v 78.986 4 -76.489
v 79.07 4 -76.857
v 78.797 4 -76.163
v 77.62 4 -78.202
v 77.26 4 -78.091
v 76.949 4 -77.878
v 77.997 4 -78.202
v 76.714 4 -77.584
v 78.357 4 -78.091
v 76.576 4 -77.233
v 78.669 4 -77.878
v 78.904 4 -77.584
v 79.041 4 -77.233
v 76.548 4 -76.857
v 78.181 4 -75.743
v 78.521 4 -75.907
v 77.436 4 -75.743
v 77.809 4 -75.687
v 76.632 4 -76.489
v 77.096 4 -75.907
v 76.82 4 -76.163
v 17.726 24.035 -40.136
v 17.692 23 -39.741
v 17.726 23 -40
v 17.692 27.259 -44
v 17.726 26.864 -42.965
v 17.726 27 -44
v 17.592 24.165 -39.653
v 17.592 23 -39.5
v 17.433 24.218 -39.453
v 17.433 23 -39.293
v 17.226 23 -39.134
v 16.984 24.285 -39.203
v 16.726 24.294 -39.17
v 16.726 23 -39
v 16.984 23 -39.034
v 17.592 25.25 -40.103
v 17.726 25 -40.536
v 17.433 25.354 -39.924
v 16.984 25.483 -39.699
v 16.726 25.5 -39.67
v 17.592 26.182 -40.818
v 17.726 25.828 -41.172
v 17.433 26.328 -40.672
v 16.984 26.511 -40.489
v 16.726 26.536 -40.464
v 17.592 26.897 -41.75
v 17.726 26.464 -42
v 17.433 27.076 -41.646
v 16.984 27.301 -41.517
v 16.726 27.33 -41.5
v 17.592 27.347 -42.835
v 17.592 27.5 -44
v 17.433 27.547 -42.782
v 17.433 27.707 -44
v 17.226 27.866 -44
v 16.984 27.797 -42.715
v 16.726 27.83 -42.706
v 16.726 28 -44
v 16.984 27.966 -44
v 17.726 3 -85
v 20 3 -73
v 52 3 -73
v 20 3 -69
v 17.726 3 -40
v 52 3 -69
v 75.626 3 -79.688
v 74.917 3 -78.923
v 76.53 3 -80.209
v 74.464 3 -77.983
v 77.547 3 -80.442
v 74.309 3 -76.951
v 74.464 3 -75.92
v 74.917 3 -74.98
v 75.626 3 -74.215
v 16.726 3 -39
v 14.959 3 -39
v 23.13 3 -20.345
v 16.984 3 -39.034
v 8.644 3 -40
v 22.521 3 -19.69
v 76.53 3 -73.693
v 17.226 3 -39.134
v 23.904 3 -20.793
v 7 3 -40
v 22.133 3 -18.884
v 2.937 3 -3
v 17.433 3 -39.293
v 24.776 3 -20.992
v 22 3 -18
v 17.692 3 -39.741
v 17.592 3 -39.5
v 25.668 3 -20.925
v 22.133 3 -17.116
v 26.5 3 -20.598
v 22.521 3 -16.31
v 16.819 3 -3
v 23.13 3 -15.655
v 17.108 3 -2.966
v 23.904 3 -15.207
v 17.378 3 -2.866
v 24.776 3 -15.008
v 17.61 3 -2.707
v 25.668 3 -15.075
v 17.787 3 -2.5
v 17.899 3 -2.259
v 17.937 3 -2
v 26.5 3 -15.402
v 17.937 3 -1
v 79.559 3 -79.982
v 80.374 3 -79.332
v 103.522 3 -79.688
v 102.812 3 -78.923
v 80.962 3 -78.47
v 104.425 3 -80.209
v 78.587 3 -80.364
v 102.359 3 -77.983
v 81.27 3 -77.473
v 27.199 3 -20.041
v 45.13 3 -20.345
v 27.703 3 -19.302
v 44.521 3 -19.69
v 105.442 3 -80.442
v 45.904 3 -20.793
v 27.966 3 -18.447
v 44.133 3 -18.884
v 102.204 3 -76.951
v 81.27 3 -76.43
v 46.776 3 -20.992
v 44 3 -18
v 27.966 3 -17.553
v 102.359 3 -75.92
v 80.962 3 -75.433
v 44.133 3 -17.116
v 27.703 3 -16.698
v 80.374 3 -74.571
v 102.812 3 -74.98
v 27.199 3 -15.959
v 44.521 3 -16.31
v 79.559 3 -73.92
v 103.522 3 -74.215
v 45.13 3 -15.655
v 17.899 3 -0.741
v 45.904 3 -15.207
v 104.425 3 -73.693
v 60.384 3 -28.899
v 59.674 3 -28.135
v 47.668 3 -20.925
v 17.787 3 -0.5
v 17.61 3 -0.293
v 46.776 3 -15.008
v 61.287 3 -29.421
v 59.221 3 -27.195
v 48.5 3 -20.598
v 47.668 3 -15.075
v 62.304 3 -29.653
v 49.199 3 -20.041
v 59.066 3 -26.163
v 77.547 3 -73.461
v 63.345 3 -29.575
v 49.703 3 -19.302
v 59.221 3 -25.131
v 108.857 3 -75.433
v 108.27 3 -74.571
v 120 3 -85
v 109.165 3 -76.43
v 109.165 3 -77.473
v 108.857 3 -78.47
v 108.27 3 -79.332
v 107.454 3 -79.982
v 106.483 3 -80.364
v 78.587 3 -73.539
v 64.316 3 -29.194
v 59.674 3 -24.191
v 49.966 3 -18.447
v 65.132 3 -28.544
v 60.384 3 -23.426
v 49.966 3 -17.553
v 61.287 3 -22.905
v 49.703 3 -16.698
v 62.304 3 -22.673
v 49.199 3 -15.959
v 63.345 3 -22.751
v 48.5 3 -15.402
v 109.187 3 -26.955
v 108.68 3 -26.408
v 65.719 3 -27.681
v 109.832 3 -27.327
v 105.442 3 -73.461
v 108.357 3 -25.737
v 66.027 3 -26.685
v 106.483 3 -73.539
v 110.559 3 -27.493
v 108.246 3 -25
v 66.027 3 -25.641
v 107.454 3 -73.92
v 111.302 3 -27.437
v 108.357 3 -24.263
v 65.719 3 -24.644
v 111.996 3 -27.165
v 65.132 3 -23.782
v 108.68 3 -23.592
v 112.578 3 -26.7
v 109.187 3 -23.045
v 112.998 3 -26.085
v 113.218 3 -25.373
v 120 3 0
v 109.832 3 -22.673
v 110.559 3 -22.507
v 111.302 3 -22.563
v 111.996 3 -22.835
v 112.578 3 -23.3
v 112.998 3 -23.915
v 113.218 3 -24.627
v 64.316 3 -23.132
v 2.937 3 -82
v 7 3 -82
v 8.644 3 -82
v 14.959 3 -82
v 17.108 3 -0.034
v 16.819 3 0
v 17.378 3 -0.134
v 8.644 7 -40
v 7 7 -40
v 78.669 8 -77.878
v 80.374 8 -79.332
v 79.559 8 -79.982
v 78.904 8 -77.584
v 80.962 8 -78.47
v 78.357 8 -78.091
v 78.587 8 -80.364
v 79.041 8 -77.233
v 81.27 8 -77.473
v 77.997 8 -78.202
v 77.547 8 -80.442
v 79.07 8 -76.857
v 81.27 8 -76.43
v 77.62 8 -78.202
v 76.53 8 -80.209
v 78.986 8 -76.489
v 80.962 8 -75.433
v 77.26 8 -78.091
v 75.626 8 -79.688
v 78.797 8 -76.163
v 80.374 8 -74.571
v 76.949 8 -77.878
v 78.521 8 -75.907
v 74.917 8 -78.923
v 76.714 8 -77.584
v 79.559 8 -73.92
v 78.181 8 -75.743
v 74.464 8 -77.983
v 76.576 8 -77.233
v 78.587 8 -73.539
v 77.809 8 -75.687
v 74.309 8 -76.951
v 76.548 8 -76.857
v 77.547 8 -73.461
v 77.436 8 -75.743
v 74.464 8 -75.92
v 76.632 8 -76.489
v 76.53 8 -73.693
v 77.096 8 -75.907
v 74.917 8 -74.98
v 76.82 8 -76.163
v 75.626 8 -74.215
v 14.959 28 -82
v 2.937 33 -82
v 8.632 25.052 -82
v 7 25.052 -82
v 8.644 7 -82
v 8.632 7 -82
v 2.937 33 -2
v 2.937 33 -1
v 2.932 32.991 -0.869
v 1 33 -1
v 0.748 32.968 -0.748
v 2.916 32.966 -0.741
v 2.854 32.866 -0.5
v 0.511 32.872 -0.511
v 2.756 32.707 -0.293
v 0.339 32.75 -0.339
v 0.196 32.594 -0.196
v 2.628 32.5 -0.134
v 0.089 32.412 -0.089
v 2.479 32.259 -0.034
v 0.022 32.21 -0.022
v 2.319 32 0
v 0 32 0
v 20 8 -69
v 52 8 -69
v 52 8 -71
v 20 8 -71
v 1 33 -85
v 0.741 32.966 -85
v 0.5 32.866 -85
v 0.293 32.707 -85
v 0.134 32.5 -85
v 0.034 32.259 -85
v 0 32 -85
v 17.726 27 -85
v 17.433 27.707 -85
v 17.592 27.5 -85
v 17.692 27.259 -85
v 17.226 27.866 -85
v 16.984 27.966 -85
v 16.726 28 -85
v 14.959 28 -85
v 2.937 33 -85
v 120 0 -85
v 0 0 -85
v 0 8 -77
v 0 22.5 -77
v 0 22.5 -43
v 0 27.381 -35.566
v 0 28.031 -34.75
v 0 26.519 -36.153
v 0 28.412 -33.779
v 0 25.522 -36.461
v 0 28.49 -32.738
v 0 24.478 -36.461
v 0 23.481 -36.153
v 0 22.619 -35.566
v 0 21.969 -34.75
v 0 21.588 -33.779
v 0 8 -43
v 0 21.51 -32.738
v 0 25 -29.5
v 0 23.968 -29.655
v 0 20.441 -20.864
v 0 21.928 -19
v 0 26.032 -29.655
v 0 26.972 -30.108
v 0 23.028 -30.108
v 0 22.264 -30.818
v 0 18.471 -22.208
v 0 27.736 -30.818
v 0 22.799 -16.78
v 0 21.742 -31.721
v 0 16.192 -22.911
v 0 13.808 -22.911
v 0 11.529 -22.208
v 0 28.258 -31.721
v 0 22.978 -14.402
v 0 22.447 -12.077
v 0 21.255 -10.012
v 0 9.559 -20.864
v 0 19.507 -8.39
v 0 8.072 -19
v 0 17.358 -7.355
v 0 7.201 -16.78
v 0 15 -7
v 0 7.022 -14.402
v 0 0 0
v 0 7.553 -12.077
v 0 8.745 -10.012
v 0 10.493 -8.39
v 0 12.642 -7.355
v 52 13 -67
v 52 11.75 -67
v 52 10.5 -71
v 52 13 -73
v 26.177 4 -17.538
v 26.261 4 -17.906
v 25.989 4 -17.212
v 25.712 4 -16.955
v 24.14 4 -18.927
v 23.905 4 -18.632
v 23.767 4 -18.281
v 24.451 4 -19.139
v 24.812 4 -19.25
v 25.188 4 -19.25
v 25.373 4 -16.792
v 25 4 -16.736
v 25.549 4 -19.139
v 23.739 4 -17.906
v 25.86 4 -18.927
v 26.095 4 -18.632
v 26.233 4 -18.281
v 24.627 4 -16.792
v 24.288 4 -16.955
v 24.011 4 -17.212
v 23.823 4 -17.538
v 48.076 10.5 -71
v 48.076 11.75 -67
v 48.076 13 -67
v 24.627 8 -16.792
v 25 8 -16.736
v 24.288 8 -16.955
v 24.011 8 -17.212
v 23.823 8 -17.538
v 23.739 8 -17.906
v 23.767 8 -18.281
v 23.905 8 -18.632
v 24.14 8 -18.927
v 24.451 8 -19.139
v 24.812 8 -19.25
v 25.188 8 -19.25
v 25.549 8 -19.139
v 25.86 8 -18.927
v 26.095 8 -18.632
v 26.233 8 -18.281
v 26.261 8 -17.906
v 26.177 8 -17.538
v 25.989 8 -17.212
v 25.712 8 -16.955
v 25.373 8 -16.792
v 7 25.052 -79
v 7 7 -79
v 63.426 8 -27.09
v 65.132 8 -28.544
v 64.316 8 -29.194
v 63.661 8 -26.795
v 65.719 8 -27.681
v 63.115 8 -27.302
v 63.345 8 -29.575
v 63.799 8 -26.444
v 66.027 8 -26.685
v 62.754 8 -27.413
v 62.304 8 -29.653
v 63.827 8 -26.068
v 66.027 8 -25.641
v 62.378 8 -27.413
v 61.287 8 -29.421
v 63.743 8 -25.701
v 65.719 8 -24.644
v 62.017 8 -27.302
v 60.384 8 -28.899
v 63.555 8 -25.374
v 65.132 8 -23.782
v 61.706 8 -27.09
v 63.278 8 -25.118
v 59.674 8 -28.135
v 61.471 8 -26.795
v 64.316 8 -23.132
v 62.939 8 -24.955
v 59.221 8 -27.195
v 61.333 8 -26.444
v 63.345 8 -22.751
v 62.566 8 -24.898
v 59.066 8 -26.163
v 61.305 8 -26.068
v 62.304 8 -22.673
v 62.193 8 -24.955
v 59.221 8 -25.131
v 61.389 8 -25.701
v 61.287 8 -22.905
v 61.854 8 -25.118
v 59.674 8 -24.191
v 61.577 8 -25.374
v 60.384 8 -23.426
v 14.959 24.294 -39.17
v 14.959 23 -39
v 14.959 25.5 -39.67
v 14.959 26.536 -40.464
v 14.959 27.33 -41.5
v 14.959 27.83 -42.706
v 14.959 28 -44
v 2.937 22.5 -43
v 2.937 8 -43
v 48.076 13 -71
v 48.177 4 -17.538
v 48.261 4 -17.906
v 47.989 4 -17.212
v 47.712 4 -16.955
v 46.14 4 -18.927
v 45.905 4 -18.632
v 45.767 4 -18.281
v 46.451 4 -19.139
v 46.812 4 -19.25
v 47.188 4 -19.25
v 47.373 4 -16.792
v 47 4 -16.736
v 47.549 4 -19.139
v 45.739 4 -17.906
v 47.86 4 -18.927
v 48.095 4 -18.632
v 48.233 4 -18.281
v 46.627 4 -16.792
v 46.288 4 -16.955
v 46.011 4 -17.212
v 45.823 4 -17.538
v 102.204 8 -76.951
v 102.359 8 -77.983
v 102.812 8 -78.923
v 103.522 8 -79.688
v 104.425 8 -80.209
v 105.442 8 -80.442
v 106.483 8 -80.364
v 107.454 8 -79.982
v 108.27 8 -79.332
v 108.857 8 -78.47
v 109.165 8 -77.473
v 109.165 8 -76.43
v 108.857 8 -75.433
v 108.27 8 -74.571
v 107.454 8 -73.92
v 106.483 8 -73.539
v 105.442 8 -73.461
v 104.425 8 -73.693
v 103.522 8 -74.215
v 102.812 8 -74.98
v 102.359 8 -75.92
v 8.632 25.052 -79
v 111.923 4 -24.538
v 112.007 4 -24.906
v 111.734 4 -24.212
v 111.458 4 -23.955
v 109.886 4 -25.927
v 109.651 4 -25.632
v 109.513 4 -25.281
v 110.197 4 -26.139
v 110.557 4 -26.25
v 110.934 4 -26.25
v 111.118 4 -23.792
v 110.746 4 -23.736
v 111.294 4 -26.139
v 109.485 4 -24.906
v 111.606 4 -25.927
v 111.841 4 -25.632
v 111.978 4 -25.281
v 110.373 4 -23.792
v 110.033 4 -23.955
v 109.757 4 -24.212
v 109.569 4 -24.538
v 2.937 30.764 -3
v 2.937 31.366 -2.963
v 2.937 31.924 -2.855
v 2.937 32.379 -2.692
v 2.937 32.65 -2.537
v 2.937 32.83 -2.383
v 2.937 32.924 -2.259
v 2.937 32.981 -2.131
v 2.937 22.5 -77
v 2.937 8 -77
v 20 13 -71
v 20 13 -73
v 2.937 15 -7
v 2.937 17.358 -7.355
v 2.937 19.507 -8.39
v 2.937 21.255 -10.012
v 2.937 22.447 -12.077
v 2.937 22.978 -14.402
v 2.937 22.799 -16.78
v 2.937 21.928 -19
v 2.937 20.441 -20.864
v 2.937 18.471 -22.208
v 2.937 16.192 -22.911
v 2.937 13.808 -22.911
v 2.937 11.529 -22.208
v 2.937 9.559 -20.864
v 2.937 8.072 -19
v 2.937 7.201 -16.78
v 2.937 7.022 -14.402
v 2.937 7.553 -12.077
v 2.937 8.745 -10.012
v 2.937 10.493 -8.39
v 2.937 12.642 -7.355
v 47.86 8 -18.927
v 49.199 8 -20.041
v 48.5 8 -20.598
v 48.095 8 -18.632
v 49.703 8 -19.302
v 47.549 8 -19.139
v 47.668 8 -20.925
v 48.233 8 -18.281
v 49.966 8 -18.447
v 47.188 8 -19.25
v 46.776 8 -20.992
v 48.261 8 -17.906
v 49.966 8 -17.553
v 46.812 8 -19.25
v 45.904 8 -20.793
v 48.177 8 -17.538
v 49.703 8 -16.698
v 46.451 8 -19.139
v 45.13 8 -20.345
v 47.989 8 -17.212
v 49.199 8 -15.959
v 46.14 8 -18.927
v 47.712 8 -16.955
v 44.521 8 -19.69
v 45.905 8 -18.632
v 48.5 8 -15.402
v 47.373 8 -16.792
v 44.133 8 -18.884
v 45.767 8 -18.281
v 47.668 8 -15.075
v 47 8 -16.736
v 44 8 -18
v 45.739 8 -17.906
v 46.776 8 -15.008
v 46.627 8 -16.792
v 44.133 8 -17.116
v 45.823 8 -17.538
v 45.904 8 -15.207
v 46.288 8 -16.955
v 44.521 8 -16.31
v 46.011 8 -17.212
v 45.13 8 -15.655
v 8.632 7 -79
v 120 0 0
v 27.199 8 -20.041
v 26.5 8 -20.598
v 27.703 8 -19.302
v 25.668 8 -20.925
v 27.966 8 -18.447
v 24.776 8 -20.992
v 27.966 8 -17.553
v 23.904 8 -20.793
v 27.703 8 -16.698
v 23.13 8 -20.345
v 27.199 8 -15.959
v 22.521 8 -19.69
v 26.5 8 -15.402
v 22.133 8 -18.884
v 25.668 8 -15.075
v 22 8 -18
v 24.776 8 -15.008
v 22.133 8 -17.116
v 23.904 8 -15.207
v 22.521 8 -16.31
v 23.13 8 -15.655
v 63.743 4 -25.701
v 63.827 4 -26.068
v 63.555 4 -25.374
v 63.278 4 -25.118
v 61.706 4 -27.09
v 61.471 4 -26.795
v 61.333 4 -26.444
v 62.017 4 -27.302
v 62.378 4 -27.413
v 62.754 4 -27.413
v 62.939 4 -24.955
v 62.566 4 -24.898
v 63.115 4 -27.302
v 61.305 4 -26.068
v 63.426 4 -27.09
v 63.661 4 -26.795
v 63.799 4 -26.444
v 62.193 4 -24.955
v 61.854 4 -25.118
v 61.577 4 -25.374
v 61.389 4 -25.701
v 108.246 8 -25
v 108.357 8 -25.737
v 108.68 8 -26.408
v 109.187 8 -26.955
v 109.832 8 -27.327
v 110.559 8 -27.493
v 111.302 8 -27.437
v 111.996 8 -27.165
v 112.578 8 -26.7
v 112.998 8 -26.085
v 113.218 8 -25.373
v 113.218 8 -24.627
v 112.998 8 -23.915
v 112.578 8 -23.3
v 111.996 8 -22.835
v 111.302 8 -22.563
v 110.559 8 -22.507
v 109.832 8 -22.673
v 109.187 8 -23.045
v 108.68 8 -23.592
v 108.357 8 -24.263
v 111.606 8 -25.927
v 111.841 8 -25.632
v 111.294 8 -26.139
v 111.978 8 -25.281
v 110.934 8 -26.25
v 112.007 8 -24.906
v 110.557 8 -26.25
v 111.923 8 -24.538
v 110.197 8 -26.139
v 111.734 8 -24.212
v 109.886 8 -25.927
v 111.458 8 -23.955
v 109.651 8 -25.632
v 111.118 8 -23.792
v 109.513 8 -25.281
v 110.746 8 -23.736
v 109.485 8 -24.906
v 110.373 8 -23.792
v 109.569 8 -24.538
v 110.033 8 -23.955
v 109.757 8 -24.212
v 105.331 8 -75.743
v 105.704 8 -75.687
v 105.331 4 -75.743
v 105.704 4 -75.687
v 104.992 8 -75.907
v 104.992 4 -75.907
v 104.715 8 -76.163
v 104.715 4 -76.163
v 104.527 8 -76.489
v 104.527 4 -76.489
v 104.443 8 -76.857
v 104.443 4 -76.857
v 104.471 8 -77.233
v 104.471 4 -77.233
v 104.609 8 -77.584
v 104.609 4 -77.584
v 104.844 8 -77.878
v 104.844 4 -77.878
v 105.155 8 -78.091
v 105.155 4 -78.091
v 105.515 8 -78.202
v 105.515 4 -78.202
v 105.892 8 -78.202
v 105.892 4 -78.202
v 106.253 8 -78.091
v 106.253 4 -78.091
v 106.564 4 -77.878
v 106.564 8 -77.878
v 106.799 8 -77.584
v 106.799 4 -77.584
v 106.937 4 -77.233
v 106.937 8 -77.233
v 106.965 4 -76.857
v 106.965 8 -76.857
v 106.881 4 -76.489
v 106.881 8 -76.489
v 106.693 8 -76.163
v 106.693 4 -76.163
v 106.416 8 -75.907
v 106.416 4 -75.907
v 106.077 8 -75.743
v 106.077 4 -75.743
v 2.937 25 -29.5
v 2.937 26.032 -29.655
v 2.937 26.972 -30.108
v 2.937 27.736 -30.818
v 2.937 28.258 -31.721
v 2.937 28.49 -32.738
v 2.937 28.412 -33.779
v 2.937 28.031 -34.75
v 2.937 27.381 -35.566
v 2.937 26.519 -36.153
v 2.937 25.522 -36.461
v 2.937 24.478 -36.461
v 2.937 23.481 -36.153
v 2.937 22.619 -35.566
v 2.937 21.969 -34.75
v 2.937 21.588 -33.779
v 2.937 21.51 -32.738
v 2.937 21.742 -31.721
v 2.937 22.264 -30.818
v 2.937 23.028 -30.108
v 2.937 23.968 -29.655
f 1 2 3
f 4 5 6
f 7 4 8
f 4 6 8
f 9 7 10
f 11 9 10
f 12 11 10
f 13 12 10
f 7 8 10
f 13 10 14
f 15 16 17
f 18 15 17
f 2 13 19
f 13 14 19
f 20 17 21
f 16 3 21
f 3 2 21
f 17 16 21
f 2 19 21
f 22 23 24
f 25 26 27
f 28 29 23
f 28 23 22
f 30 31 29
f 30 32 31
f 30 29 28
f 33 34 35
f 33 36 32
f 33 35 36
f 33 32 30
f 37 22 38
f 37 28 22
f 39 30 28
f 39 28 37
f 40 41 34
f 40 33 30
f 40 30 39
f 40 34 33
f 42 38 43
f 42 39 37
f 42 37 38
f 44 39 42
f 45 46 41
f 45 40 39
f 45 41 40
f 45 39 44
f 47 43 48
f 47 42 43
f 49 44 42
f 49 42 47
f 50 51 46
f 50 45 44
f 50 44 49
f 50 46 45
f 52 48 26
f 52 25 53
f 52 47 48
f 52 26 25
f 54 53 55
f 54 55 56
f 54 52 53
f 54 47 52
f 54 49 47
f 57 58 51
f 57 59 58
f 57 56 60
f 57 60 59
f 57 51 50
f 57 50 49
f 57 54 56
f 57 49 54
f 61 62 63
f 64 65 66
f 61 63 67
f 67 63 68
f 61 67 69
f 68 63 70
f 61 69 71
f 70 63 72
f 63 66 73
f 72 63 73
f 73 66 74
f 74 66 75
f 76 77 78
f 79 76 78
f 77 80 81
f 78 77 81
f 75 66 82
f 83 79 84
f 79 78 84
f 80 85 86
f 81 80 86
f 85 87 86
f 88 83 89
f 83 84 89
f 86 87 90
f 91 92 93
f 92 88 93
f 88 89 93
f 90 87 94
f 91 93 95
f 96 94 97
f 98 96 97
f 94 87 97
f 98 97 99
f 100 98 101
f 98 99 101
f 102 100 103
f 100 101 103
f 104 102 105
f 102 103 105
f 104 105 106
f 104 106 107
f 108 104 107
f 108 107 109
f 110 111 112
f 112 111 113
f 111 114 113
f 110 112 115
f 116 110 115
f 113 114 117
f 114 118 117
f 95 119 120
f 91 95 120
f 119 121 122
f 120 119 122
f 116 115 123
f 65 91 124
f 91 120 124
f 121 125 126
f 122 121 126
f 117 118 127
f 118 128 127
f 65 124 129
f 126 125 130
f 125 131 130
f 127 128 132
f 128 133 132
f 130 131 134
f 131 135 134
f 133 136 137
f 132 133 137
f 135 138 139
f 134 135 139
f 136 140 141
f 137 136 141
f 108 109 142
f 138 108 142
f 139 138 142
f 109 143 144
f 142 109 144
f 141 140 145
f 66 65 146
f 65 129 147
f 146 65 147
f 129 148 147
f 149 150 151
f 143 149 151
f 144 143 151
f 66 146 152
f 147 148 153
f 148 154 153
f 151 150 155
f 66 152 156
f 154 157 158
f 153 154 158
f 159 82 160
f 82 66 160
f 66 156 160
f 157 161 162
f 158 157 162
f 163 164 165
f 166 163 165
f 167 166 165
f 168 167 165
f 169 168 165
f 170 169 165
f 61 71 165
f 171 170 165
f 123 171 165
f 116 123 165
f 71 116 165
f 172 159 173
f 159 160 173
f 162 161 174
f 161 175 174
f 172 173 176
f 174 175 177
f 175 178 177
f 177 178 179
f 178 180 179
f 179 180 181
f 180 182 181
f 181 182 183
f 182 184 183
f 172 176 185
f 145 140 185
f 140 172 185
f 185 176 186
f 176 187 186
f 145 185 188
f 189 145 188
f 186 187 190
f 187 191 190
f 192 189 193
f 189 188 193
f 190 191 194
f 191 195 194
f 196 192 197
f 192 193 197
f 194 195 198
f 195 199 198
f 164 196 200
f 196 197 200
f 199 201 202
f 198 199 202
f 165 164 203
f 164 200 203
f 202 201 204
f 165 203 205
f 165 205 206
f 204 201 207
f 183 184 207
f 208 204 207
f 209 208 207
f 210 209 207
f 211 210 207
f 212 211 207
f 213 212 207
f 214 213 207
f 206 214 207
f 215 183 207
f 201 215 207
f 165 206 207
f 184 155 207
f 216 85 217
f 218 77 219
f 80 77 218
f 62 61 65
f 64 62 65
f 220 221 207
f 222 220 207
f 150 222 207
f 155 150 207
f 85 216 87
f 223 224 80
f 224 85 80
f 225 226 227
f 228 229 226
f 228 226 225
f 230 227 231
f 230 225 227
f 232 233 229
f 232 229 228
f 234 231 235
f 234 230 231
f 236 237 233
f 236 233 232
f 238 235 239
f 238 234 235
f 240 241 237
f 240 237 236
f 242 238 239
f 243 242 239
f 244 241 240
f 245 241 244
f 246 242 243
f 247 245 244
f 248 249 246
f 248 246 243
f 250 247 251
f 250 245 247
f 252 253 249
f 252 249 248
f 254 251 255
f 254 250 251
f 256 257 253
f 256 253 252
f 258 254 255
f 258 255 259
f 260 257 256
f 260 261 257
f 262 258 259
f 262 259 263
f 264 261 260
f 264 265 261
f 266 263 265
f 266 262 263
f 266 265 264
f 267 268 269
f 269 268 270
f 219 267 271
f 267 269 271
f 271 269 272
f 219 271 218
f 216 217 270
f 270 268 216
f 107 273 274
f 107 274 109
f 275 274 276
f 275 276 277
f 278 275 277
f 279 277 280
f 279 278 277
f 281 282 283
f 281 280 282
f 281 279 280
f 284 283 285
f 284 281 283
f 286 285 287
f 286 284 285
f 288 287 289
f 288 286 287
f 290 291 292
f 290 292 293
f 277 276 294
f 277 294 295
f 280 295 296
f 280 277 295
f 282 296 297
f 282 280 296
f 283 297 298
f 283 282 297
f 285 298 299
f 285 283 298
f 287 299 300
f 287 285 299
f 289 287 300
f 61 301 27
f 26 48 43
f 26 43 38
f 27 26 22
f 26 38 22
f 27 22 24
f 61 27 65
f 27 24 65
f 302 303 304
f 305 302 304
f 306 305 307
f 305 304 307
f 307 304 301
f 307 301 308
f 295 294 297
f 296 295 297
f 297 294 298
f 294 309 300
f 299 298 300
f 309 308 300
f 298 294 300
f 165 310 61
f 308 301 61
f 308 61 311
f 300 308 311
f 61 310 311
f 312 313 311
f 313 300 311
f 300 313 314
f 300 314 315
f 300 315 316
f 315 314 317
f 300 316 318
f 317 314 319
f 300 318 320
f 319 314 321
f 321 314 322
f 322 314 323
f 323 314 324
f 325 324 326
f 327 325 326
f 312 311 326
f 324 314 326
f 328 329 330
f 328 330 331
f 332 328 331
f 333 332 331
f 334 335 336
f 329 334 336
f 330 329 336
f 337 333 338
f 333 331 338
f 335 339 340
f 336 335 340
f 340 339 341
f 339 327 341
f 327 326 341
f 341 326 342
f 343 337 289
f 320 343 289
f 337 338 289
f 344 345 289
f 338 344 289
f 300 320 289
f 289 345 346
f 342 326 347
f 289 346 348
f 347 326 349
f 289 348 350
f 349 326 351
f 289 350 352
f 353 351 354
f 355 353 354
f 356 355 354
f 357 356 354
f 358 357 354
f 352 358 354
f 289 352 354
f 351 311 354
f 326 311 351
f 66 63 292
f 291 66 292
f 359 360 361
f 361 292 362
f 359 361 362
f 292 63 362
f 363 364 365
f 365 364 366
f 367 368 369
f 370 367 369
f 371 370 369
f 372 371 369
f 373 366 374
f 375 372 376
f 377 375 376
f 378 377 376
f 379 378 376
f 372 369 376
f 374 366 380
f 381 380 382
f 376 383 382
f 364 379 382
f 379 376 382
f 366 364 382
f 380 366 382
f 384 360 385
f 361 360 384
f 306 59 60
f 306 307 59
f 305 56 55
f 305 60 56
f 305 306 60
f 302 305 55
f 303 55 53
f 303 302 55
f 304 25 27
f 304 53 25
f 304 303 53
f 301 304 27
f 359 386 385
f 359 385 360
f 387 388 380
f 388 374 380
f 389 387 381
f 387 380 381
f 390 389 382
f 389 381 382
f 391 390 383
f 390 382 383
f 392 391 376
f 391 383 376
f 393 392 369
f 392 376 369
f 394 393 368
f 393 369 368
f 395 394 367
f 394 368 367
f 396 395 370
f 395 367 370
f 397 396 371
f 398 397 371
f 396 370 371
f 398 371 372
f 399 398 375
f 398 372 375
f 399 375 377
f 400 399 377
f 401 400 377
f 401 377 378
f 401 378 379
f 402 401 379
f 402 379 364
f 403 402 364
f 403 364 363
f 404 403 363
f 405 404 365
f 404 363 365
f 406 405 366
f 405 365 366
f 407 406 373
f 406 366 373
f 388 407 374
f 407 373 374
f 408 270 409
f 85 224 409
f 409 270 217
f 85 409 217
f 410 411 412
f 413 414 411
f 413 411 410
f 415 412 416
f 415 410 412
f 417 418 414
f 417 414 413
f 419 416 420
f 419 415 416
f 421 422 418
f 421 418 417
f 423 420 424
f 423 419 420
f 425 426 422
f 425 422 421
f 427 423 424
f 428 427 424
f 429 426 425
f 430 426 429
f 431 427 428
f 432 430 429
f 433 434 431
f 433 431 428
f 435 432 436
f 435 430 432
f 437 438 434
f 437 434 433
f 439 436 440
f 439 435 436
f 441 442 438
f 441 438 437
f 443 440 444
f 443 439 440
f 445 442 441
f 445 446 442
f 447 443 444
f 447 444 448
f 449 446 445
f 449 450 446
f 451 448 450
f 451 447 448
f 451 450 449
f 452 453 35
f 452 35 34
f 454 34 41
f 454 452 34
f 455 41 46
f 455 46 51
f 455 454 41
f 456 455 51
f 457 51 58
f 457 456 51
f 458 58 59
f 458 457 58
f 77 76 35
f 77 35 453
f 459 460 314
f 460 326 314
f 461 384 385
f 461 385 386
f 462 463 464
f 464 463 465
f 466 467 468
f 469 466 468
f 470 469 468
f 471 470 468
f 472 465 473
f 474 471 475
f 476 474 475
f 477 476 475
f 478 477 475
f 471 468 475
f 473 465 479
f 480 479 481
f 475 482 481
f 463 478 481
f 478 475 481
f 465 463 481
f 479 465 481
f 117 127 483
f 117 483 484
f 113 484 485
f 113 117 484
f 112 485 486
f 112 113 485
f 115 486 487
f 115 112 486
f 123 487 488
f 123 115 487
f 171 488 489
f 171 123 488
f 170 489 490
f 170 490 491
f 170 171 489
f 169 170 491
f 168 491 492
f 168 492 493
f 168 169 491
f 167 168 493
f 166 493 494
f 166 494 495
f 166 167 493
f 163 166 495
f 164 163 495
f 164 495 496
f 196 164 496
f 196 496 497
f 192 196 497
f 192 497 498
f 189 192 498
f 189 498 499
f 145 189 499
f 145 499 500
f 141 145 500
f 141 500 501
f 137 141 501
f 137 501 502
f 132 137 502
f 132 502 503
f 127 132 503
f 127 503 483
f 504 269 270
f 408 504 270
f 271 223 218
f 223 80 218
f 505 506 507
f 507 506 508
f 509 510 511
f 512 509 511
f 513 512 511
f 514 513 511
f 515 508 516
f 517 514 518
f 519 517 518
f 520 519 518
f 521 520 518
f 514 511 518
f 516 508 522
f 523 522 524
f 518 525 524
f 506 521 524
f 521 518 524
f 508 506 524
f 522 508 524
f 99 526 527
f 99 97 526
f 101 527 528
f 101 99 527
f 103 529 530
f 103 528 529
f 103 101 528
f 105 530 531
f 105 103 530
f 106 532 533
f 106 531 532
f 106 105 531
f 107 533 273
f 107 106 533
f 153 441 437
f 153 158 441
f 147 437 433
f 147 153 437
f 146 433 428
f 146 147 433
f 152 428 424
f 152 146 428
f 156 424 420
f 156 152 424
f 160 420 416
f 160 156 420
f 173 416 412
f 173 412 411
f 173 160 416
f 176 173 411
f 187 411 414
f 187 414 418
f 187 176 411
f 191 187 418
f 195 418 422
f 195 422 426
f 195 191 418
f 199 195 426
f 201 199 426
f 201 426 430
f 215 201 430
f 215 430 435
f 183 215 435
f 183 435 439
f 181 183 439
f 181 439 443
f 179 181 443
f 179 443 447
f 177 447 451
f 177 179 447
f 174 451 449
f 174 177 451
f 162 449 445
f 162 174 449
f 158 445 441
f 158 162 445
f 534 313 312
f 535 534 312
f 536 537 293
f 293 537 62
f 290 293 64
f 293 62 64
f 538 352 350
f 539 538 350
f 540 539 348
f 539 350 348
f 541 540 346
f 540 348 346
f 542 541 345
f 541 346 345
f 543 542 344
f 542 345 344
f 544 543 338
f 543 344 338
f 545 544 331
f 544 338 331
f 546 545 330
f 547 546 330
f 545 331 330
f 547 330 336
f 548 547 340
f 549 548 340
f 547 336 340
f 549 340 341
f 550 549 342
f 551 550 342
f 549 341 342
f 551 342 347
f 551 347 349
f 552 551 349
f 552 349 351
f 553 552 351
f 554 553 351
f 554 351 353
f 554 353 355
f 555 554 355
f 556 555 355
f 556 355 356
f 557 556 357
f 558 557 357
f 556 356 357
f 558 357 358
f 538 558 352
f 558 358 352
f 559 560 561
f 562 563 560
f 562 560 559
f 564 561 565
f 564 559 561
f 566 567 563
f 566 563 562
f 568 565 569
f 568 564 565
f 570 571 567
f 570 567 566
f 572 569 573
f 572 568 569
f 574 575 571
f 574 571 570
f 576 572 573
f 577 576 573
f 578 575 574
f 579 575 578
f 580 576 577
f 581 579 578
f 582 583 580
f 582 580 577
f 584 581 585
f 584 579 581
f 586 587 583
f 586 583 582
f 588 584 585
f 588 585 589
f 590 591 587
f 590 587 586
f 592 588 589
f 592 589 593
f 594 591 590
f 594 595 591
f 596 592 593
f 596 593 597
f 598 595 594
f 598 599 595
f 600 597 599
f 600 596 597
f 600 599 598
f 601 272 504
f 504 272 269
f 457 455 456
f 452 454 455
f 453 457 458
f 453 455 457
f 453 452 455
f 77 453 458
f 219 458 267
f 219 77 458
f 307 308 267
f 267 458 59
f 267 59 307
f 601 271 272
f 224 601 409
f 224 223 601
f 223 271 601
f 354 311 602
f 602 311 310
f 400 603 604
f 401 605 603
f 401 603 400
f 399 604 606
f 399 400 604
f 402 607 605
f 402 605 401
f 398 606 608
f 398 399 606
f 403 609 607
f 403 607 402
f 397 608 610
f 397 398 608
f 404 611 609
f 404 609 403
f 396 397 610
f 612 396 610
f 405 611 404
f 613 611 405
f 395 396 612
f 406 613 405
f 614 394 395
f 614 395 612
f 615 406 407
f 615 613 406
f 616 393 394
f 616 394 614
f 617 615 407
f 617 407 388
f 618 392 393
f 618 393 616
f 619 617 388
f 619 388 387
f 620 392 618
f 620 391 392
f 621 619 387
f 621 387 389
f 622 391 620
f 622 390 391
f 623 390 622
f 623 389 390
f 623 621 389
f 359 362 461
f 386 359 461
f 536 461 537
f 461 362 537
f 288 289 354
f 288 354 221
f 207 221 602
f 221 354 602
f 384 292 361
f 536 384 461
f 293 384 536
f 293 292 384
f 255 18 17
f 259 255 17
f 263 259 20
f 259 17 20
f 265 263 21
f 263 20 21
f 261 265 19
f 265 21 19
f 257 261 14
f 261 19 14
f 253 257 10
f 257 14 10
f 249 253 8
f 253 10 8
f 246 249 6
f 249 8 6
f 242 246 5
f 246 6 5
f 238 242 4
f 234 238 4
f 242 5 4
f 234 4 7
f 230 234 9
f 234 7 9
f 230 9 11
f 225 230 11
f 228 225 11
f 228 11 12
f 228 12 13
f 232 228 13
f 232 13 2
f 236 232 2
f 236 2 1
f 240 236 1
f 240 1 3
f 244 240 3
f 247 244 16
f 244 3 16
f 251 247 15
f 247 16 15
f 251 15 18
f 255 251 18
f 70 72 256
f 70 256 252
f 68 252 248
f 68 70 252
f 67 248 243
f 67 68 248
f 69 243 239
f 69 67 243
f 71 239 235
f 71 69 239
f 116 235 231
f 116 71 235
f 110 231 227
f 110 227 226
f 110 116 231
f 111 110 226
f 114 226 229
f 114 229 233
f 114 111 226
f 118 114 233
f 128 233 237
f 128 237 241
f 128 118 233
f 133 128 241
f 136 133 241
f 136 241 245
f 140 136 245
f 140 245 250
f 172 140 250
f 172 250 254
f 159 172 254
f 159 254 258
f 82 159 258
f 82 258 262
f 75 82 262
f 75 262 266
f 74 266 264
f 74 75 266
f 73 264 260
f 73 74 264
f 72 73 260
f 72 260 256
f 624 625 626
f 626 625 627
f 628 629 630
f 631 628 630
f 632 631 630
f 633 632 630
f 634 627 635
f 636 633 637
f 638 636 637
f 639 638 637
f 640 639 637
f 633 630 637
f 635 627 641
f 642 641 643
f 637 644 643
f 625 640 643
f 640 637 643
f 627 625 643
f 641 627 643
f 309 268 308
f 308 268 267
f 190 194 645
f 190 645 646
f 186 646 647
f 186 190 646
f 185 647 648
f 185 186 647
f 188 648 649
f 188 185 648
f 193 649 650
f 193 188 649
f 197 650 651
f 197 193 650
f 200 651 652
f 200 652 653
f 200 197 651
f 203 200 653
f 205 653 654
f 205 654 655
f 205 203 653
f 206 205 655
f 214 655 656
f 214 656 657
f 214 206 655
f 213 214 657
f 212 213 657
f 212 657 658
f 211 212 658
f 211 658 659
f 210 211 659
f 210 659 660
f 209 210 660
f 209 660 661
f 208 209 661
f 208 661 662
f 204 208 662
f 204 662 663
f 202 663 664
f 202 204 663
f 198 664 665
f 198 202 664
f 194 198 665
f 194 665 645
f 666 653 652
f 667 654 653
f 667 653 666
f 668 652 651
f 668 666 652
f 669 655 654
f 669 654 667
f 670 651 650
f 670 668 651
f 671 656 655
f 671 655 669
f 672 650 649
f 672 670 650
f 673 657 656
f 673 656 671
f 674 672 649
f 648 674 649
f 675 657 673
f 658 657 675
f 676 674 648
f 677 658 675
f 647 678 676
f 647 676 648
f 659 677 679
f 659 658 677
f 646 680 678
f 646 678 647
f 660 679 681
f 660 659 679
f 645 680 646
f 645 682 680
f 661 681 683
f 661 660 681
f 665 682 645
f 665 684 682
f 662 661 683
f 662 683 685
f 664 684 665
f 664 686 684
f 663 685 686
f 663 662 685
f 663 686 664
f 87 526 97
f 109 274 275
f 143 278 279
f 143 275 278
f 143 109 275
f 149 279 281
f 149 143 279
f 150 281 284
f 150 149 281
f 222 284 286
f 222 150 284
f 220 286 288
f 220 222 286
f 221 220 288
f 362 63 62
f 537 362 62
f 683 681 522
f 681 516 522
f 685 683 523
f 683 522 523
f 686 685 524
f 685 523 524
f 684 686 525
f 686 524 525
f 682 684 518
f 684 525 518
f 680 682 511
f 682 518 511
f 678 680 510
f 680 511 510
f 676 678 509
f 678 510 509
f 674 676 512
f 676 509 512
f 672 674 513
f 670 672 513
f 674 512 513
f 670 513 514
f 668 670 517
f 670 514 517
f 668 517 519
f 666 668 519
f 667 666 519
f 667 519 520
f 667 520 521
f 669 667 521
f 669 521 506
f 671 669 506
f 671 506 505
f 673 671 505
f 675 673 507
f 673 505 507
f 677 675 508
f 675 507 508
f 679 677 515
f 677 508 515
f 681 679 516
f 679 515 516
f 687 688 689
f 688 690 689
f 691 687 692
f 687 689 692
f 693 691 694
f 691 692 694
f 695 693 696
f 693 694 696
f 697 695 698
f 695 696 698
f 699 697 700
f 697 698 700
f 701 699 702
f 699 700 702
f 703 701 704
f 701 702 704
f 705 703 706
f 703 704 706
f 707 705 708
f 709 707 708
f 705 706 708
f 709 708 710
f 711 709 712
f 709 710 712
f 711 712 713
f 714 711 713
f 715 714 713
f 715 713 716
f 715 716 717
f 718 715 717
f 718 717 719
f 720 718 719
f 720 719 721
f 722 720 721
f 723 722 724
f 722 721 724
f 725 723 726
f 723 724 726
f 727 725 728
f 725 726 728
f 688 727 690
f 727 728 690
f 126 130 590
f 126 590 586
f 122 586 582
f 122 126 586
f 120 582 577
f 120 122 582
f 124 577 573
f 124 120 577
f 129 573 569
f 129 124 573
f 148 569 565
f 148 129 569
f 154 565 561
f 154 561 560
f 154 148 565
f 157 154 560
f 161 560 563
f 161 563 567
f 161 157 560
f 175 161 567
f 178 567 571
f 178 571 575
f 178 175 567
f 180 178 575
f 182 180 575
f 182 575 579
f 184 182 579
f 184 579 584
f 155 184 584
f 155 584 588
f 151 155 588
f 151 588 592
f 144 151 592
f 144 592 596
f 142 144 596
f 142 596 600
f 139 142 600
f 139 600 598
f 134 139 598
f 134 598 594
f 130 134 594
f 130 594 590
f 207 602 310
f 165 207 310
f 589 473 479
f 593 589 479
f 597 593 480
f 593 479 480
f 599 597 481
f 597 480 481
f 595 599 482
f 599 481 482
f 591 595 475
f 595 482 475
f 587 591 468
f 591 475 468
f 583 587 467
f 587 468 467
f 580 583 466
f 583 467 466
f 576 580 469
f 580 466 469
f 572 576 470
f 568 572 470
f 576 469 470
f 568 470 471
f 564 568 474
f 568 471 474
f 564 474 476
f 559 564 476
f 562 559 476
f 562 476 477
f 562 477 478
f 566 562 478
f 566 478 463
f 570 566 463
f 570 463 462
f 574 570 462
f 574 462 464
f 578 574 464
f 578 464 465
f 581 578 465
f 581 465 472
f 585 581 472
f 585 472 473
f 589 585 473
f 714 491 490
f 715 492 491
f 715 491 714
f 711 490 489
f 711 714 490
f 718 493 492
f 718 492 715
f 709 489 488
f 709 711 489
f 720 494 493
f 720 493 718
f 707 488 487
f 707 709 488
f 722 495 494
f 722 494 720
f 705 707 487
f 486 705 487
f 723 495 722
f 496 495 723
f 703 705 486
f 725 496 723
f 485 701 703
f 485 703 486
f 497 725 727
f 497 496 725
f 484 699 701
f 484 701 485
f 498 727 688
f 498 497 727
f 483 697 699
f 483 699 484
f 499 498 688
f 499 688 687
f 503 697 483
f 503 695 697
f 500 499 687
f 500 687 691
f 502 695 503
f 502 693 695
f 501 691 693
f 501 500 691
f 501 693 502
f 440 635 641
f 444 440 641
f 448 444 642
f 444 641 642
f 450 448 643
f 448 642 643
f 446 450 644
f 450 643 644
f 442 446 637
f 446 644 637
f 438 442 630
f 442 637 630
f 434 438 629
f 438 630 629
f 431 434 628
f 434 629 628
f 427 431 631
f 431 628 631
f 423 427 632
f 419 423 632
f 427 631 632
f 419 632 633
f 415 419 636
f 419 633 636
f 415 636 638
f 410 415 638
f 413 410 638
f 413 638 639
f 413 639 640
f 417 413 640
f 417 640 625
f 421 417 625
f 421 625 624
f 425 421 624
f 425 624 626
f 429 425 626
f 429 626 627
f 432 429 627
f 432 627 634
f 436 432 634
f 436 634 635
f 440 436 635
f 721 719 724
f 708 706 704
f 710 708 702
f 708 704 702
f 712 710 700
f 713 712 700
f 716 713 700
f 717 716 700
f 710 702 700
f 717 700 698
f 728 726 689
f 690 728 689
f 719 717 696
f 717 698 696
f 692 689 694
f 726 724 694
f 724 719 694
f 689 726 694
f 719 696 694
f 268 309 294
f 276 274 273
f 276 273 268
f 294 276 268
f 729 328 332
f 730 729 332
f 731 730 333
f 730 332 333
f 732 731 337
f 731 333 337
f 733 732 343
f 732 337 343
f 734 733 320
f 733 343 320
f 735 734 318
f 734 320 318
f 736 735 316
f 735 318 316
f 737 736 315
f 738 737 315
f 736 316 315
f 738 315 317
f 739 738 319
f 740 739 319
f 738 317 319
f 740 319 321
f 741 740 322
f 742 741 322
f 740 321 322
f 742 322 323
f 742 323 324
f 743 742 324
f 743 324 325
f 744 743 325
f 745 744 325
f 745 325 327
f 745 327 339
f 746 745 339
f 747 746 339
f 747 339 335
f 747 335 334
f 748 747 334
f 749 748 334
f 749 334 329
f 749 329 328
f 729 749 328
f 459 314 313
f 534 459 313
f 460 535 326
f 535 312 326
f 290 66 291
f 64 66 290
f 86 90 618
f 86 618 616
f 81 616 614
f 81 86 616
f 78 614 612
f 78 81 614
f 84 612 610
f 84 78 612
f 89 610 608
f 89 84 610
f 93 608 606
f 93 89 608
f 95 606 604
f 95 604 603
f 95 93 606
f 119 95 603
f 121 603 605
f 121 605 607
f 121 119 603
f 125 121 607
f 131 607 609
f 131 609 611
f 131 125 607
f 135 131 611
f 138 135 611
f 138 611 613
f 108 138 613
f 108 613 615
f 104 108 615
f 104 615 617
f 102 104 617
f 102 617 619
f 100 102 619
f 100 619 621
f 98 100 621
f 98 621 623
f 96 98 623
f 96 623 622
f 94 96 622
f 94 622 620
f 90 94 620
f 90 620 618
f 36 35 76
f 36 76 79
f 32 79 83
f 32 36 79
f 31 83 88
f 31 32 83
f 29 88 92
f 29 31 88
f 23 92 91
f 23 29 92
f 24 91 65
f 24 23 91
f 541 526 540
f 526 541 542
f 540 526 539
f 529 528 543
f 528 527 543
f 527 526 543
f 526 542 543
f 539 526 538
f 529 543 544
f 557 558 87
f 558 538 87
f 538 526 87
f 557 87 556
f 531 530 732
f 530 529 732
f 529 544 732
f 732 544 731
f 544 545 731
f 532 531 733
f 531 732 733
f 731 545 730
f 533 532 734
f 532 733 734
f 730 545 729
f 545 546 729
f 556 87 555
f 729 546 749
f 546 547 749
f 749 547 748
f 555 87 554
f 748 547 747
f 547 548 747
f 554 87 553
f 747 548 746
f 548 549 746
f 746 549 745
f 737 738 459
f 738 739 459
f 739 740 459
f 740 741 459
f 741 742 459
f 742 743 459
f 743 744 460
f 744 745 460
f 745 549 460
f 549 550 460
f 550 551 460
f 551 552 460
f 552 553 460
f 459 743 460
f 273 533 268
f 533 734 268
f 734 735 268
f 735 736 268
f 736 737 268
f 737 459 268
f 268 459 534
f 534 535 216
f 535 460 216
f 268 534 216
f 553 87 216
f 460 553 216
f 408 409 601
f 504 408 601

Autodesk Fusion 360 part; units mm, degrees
sketch "Sketch1" plane through (0, 0, 0) normal (0, 1, 0) x (1, 0, 0)
  line L0 (0, 0) -> (120, 0)
  line L1 (120, 0) -> (120, 85)
  line L2 (120, 85) -> (0, 85)
  line L3 (0, 85) -> (0, 0)
extrude "Extrude1" add sketch "Sketch1" along normal blind 3
sketch "Sketch2" plane through (0, 3, 0) normal (0, 1, 0) x (-1, 0, 0)
  line L0 (0, -85) -> (0, 0)
  line L1 (0, 0) -> (-120, 0)
  line L2 (-120, 0) -> (-120, -85)
  line L3 (-120, -85) -> (0, -85)
  line L4 (-60, -85) -> (-60, 0)
  line L5 (-60, -76.9514) -> (-120, -76.9514)
  line L6 (-77.8086, -80) -> (-77.8086, -73)
  circle A0 centre (-77.8086, -76.9514) radius 3.5
  circle A1 centre (-105.7039, -76.9514) radius 3.5
  dimension "d3" = 7
  dimension "d4" = 7
sketch "Sketch3" plane through (0, 3, 0) normal (0, 1, 0) x (-1, 0, 0)
  line L0 (-60, -10.9513) -> (-119.9962, -10.9513)
  line L1 (-60, -85) -> (-60, 0)
  line L2 (-60, -26.1629) -> (-72, -26.1629)
  line L3 (-62.566, -28.9848) -> (-62.566, -23)
  circle A0 centre (-62.566, -26.1629) radius 3.5
  line L4 (-107.0217, -24.9659) -> (-120.1868, -24.9659)
  line L5 (-110.7456, -28) -> (-110.7456, -22)
  circle A1 centre (-110.7456, -25) radius 2.5
  line L6 (-55, 0) -> (-55.9638, 0)
  line L7 (-55.9638, 0) -> (-55.9638, -85)
  line L8 (-55.9638, -85) -> (-55, -85)
  line L9 (-55, -85) -> (-55, 0)
  line L10 (0, 0) -> (-120, 0)
  line L11 (-120, -85) -> (0, -85)
  dimension "d5" = 7
  dimension "d6" = 5
extrude "Extrude2" add sketch "Sketch2" sketch "Sketch3" along normal blind 5 contours L5 A0 | L5 L6 A0 | L5 A1 | L5 A1 | L5 L6 A0 of sketch 2 contours L1 A0 | L1 L2 A0 | L1 L2 A0 | L4 L5 A1 | L4 L5 A1 | L4 L5 A1 | L4 L5 A1
hole "Hole1" at (77.8086, 8, -76.9514) direction (0, -1, 0) diameter 2.529 depth 4 tip angle 180
hole "Hole2" at (105.7039, 8, -76.9514) direction (0, -1, 0) diameter 2.529 depth 4 tip angle 180
hole "Hole3" at (62.566, 8, -26.1629) direction (0, -1, 0) diameter 2.529 depth 4 tip angle 180
hole "Hole4" at (110.7456, 8, -25) direction (0, -1, 0) diameter 2.529 depth 4 tip angle 180
sketch "Sketch4" plane through (0, 3, 0) normal (0, 1, 0) x (-1, 0, 0)
  circle A0 centre (-62.566, -26.1629) radius 3.5
  circle A1 centre (-105.7039, -76.9514) radius 3.5
  circle A2 centre (-77.8086, -76.9514) radius 3.5
  circle A3 centre (-110.7456, -25) radius 2.5
  line L0 (0, -85) -> (0, 0)
  line L1 (0, 0) -> (-120, 0)
  line L2 (-120, 0) -> (-120, -85)
  line L3 (-120, -85) -> (0, -85)
  line L4 (-50, -15) -> (-22, -15)
  line L5 (-22, -15) -> (-22, -70)
  line L6 (-22, -70) -> (-50, -70)
  line L7 (-50, -70) -> (-50, -15)
  line L8 (-22, -18) -> (-50, -18)
  circle A4 centre (-25, -18) radius 3
  circle A5 centre (-47, -18) radius 3
  line L9 (-20, -70) -> (-52, -70)
  line L10 (-52, -70) -> (-52, -69)
  line L11 (-52, -69) -> (-20, -69)
  line L12 (-20, -69) -> (-20, -70)
  dimension "d21" = 6
  dimension "d22" = 6
extrude "Extrude3" add sketch "Sketch4" along normal blind 5 contours L8 A5 | L8 A5 | L8 A4 | L5 L6 L7 L9 L11 | L7 L9 L10 L11 | L8 A4 | L5 L9 L11 L12
hole "Hole5" at (25, 8, -18) direction (0, -1, 0) diameter 2.529 depth 4 tip angle 180
hole "Hole6" at (47, 8, -18) direction (0, -1, 0) diameter 2.529 depth 4 tip angle 180
sketch "Sketch5" plane through (0, 3, 0) normal (0, 1, 0) x (-1, 0, 0)
  circle A0 centre (-47, -18) radius 3
  circle A1 centre (-25, -18) radius 3
  line L0 (-20, -69) -> (-20, -70)
  line L1 (-20, -70) -> (-52, -70)
  line L2 (-52, -70) -> (-52, -69)
  line L3 (-52, -69) -> (-20, -69)
  circle A2 centre (-62.566, -26.1629) radius 3.5
  circle A3 centre (-105.7039, -76.9514) radius 3.5
  circle A4 centre (-77.8086, -76.9514) radius 3.5
  circle A5 centre (-110.7456, -25) radius 2.5
  line L4 (0, -85) -> (0, 0)
  line L5 (0, 0) -> (-120, 0)
  line L6 (-120, 0) -> (-120, -85)
  line L7 (-120, -85) -> (0, -85)
  line L8 (-20, -70) -> (-52, -70)
  line L9 (-52, -70) -> (-52, -73)
  line L10 (-52, -73) -> (-20, -73)
  line L11 (-20, -73) -> (-20, -70)
extrude "Extrude4" add sketch "Sketch5" along normal blind 5 contours L1 L8 L9 L10 L11
sketch "Sketch6" plane through (0, 8, 0) normal (0, 1, 0) x (-1, 0, 0)
  line L0 (-20, -69) -> (-52, -69)
  line L1 (-52, -69) -> (-52, -73)
  line L2 (-52, -73) -> (-20, -73)
  line L3 (-20, -73) -> (-20, -69)
  line L4 (-20, -73) -> (-52, -73)
  line L5 (-52, -73) -> (-52, -71)
  line L6 (-52, -71) -> (-20, -71)
  line L7 (-20, -71) -> (-20, -73)
extrude "Extrude5" add sketch "Sketch6" along normal blind 5 contours L1 L2 L3 L4 L5 L6 L7
sketch "Sketch7" plane through (0, 0, -71) normal (0, 0, 1) x (1, 0, 0)
  line L0 (20, 8) -> (52, 8)
  line L1 (52, 8) -> (52, 13)
  line L2 (52, 13) -> (20, 13)
  line L3 (20, 13) -> (20, 8)
  line L4 (48.0761, 13) -> (52, 13)
  line L5 (52, 13) -> (52, 10.5)
  line L6 (52, 10.5) -> (48.0761, 10.5)
  line L7 (48.0761, 10.5) -> (48.0761, 13)
extrude "Extrude6" add sketch "Sketch7" along normal blind 4 contours L1 L2 L4 L5 L6 L7
sketch "Sketch8" plane through (52, 0, 0) normal (1, 0, 0) x (0, 0, -1)
  line L0 (69, 3) -> (73, 3)
  line L1 (73, 3) -> (73, 13)
  line L2 (73, 13) -> (67, 13)
  line L3 (67, 13) -> (67, 10.5)
  line L4 (67, 10.5) -> (71, 10.5)
  line L5 (71, 10.5) -> (71, 8)
  line L6 (71, 8) -> (69, 8)
  line L7 (69, 8) -> (69, 3)
  line L8 (67, 11.75) -> (71, 10.5)
extrude "Extrude7" cut sketch "Sketch8" against normal blind 4 contours L3 L4 L8
sketch "Sketch9" plane through (0, 3, 0) normal (0, 1, 0) x (-1, 0, 0)
  line L0 (-52, -73) -> (-52, -69)
  line L1 (-52, -69) -> (-20, -69)
  line L2 (-20, -69) -> (-20, -73)
  line L3 (-20, -73) -> (-52, -73)
  circle A0 centre (-47, -18) radius 3
  circle A1 centre (-25, -18) radius 3
  circle A2 centre (-62.566, -26.1629) radius 3.5
  circle A3 centre (-105.7039, -76.9514) radius 3.5
  circle A4 centre (-77.8086, -76.9514) radius 3.5
  circle A5 centre (-110.7456, -25) radius 2.5
  line L4 (0, -85) -> (0, 0)
  line L5 (0, 0) -> (-120, 0)
  line L6 (-120, 0) -> (-120, -85)
  line L7 (-120, -85) -> (0, -85)
  line L8 (0, 0) -> (-2.9371, 0)
  line L9 (-2.9371, 0) -> (-2.9371, -85)
  line L10 (-2.9371, -85) -> (0, -85)
  line L11 (0, -85) -> (0, 0)
  line L12 (0, 0) -> (-3, 0)
  line L13 (-3, 0) -> (-3, -85)
  line L14 (-3, -85) -> (0, -85)
  line L15 (0, -85) -> (0, 0)
  dimension "d39" = 3
extrude "Extrude8" add sketch "Sketch9" along normal blind 30 contours L4 L5 L7 L8 L9 L10 L11 L12 L14 L15
sketch "Sketch10" plane through (2.9371, 0, 0) normal (1, 0, 0) x (0, 0, -1)
  line L0 (0, 3) -> (85, 3)
  line L1 (85, 3) -> (85, 33)
  line L2 (85, 33) -> (0, 33)
  line L3 (0, 33) -> (0, 3)
  line L4 (0, 33) -> (3, 33)
  line L5 (3, 33) -> (3, 3)
  line L6 (3, 3) -> (0, 3)
  line L7 (0, 3) -> (0, 33)
  line L8 (85, 33) -> (82, 33)
  line L9 (82, 33) -> (82, 3)
  line L10 (82, 3) -> (85, 3)
  line L11 (85, 3) -> (85, 33)
  dimension "d42" = 3
  dimension "d43" = 3
extrude "Extrude9" add sketch "Sketch10" along normal blind 15 contours L0 L2 L3 L4 L5 L6 L7 | L0 L1 L2 L8 L9 L10 L11
sketch "Sketch11" plane through (0, 0, -3) normal (0, 0, -1) x (-1, 0, 0)
  line L0 (-2.9371, 3) -> (-2.9371, 33)
  line L1 (-2.9371, 33) -> (-17.9371, 33)
  line L2 (-17.9371, 33) -> (-17.9371, 3)
  line L3 (-17.9371, 3) -> (-2.9371, 3)
  line L4 (-2.9371, 33) -> (-17.9371, 3)
extrude "Extrude10" cut sketch "Sketch11" against normal blind 4 contours L1 L2 L4
sketch "Sketch13" plane through (0, 3, 0) normal (0, 1, 0) x (-1, 0, 0)
  line L0 (-17.9371, -82) -> (-2.9371, -82)
  line L1 (-2.9371, -82) -> (-2.9371, -3)
  line L2 (-2.9371, -3) -> (-17.9371, -3)
  line L3 (-17.9371, -3) -> (-17.9371, 0)
  line L4 (-17.9371, 0) -> (-120, 0)
  line L5 (-120, 0) -> (-120, -85)
  line L6 (-120, -85) -> (-17.9371, -85)
  line L7 (-52, -73) -> (-52, -69)
  line L8 (-52, -69) -> (-20, -69)
  line L9 (-20, -69) -> (-20, -73)
  line L10 (-20, -73) -> (-52, -73)
  circle A0 centre (-47, -18) radius 3
  circle A1 centre (-25, -18) radius 3
  circle A2 centre (-62.566, -26.1629) radius 3.5
  circle A3 centre (-105.7039, -76.9514) radius 3.5
  circle A4 centre (-77.8086, -76.9514) radius 3.5
  circle A5 centre (-110.7456, -25) radius 2.5
  line L11 (-14.9586, -82) -> (-17.7256, -82)
  line L12 (-17.7256, -82) -> (-17.7256, -39)
  line L13 (-17.7256, -39) -> (-14.9586, -39)
  line L14 (-14.9586, -39) -> (-14.9586, -82)
  line L15 (-17.9371, -85) -> (-17.9371, -82)
extrude "Extrude12" add sketch "Sketch13" along normal blind 25 contours L0 L11 L12 L13 L14
sketch "Sketch14" plane through (0, 0, -82) normal (0, 0, 1) x (1, 0, 0)
  line L0 (17.7256, 28) -> (17.7256, 3)
  line L1 (17.7256, 3) -> (17.9371, 3)
  line L2 (17.9371, 3) -> (17.9371, 33)
  line L3 (17.9371, 33) -> (2.9371, 33)
  line L4 (2.9371, 33) -> (2.9371, 3)
  line L5 (2.9371, 3) -> (14.9586, 3)
  line L6 (14.9586, 3) -> (14.9586, 28)
  line L7 (14.9586, 28) -> (17.7256, 28)
  line L8 (2.9371, 33) -> (14.9586, 28)
extrude "Extrude13" cut sketch "Sketch14" against normal blind 4 contours L0 L1 L2 L3 L7 L8
sketch "Sketch15" plane through (0, 0, 0) normal (-1, 0, 0) x (0, 0, 1)
  line L0 (-85, 0) -> (0, 0)
  line L1 (0, 0) -> (0, 33)
  line L2 (0, 33) -> (-85, 33)
  line L3 (-85, 33) -> (-85, 0)
  line L4 (-77, 8) -> (-43, 8)
  line L5 (-43, 8) -> (-43, 22.5)
  line L6 (-43, 22.5) -> (-77, 22.5)
  line L7 (-77, 22.5) -> (-77, 8)
  dimension "d54" = 34
  dimension "d55" = 14.5
extrude "Extrude14" cut sketch "Sketch15" against normal blind 5 contours L4 L5 L6 L7
sketch "Sketch16" plane through (0, 0, 0) normal (-1, 0, 0) x (0, 0, 1)
  line L0 (-43, 8) -> (-77, 8)
  line L1 (-77, 8) -> (-77, 22.5)
  line L2 (-77, 22.5) -> (-43, 22.5)
  line L3 (-43, 22.5) -> (-43, 8)
  line L4 (-85, 0) -> (0, 0)
  line L5 (0, 0) -> (0, 33)
  line L6 (0, 33) -> (-85, 33)
  line L7 (-85, 33) -> (-85, 0)
  circle A0 centre (-15, 15) radius 8
  circle A1 centre (-33, 25) radius 3.5
  dimension "d58" = 16
  dimension "d59" = 7
extrude "Extrude15" cut sketch "Sketch16" against normal blind 4 contours A0 | A1
fillet "Fillet1" radius 5 1 edges at (16.3421, 28, -39)
fillet "Fillet2" radius 1 4 edges at (1.4685, 33, 0) (10.4371, 18, 0) (10.4371, 18, -3) (0, 33, -42.5)
fillet "Fillet3" radius 1 3 edges at (17.7256, 13, -39) (17.7256, 26.5355, -40.4645) (17.7256, 28, -64.5)
sketch "Sketch17" plane through (0, 3, 0) normal (0, 1, 0) x (-1, 0, 0)
  circle A0 centre (-110.7456, -25) radius 2.5
  circle A1 centre (-77.8086, -76.9514) radius 3.5
  circle A2 centre (-105.7039, -76.9514) radius 3.5
  circle A3 centre (-62.566, -26.1629) radius 3.5
  circle A4 centre (-25, -18) radius 3
  circle A5 centre (-47, -18) radius 3
  line L0 (-52, -73) -> (-52, -69)
  line L1 (-52, -69) -> (-20, -69)
  line L2 (-20, -69) -> (-20, -73)
  line L3 (-20, -73) -> (-52, -73)
  line L4 (-16.7256, -39) -> (-14.9586, -39)
  line L5 (-14.9586, -39) -> (-14.9586, -82)
  line L6 (-14.9586, -82) -> (-2.9371, -82)
  line L7 (-2.9371, -82) -> (-2.9371, -3)
  line L8 (-2.9371, -3) -> (-16.8191, -3)
  ellipse E0 centre (-16.8191, -2) end of major axis (-17.9371, -2) minor radius 1 (-17.9371, -2) -> (-16.8191, -3) ccw
  line L9 (-17.9371, -2) -> (-17.9371, -1)
  ellipse E1 centre (-16.8191, -1) end of major axis (-17.9371, -1) minor radius 1 (-16.8191, 0) -> (-17.9371, -1) ccw
  line L10 (-16.8191, 0) -> (-120, 0)
  line L11 (-120, 0) -> (-120, -85)
  line L12 (-120, -85) -> (-17.7256, -85)
  line L13 (-17.7256, -85) -> (-17.7256, -40)
  arc A6 (-16.7256, -39) -> (-17.7256, -40) centre (-16.7256, -40) ccw
  line L14 (-8.6438, -82) -> (-7, -82)
  line L15 (-7, -82) -> (-7, -40)
  line L16 (-7, -40) -> (-8.6438, -40)
  line L17 (-8.6438, -40) -> (-8.6438, -82)
extrude "Extrude16" add sketch "Sketch17" along normal blind 4 contours L6 L14 L15 L16 L17
sketch "Sketch18" plane through (0, 0, -82) normal (0, 0, 1) x (1, 0, 0)
  line L0 (8.6438, 7) -> (8.6438, 3)
  line L1 (8.6438, 3) -> (14.9586, 3)
  line L2 (14.9586, 3) -> (14.9586, 28)
  line L3 (14.9586, 28) -> (2.9371, 33)
  line L4 (2.9371, 33) -> (2.9371, 3)
  line L5 (2.9371, 3) -> (7, 3)
  line L6 (7, 3) -> (7, 7)
  line L7 (7, 7) -> (8.6438, 7)
  line L8 (7, 7) -> (8.6319, 7)
  line L9 (8.6319, 7) -> (8.6319, 25.0515)
  line L10 (8.6319, 25.0515) -> (7, 25.0515)
  line L11 (7, 25.0515) -> (7, 7)
extrude "Extrude17" add sketch "Sketch18" along normal blind 3 contours L7 L8 L9 L10 L11
